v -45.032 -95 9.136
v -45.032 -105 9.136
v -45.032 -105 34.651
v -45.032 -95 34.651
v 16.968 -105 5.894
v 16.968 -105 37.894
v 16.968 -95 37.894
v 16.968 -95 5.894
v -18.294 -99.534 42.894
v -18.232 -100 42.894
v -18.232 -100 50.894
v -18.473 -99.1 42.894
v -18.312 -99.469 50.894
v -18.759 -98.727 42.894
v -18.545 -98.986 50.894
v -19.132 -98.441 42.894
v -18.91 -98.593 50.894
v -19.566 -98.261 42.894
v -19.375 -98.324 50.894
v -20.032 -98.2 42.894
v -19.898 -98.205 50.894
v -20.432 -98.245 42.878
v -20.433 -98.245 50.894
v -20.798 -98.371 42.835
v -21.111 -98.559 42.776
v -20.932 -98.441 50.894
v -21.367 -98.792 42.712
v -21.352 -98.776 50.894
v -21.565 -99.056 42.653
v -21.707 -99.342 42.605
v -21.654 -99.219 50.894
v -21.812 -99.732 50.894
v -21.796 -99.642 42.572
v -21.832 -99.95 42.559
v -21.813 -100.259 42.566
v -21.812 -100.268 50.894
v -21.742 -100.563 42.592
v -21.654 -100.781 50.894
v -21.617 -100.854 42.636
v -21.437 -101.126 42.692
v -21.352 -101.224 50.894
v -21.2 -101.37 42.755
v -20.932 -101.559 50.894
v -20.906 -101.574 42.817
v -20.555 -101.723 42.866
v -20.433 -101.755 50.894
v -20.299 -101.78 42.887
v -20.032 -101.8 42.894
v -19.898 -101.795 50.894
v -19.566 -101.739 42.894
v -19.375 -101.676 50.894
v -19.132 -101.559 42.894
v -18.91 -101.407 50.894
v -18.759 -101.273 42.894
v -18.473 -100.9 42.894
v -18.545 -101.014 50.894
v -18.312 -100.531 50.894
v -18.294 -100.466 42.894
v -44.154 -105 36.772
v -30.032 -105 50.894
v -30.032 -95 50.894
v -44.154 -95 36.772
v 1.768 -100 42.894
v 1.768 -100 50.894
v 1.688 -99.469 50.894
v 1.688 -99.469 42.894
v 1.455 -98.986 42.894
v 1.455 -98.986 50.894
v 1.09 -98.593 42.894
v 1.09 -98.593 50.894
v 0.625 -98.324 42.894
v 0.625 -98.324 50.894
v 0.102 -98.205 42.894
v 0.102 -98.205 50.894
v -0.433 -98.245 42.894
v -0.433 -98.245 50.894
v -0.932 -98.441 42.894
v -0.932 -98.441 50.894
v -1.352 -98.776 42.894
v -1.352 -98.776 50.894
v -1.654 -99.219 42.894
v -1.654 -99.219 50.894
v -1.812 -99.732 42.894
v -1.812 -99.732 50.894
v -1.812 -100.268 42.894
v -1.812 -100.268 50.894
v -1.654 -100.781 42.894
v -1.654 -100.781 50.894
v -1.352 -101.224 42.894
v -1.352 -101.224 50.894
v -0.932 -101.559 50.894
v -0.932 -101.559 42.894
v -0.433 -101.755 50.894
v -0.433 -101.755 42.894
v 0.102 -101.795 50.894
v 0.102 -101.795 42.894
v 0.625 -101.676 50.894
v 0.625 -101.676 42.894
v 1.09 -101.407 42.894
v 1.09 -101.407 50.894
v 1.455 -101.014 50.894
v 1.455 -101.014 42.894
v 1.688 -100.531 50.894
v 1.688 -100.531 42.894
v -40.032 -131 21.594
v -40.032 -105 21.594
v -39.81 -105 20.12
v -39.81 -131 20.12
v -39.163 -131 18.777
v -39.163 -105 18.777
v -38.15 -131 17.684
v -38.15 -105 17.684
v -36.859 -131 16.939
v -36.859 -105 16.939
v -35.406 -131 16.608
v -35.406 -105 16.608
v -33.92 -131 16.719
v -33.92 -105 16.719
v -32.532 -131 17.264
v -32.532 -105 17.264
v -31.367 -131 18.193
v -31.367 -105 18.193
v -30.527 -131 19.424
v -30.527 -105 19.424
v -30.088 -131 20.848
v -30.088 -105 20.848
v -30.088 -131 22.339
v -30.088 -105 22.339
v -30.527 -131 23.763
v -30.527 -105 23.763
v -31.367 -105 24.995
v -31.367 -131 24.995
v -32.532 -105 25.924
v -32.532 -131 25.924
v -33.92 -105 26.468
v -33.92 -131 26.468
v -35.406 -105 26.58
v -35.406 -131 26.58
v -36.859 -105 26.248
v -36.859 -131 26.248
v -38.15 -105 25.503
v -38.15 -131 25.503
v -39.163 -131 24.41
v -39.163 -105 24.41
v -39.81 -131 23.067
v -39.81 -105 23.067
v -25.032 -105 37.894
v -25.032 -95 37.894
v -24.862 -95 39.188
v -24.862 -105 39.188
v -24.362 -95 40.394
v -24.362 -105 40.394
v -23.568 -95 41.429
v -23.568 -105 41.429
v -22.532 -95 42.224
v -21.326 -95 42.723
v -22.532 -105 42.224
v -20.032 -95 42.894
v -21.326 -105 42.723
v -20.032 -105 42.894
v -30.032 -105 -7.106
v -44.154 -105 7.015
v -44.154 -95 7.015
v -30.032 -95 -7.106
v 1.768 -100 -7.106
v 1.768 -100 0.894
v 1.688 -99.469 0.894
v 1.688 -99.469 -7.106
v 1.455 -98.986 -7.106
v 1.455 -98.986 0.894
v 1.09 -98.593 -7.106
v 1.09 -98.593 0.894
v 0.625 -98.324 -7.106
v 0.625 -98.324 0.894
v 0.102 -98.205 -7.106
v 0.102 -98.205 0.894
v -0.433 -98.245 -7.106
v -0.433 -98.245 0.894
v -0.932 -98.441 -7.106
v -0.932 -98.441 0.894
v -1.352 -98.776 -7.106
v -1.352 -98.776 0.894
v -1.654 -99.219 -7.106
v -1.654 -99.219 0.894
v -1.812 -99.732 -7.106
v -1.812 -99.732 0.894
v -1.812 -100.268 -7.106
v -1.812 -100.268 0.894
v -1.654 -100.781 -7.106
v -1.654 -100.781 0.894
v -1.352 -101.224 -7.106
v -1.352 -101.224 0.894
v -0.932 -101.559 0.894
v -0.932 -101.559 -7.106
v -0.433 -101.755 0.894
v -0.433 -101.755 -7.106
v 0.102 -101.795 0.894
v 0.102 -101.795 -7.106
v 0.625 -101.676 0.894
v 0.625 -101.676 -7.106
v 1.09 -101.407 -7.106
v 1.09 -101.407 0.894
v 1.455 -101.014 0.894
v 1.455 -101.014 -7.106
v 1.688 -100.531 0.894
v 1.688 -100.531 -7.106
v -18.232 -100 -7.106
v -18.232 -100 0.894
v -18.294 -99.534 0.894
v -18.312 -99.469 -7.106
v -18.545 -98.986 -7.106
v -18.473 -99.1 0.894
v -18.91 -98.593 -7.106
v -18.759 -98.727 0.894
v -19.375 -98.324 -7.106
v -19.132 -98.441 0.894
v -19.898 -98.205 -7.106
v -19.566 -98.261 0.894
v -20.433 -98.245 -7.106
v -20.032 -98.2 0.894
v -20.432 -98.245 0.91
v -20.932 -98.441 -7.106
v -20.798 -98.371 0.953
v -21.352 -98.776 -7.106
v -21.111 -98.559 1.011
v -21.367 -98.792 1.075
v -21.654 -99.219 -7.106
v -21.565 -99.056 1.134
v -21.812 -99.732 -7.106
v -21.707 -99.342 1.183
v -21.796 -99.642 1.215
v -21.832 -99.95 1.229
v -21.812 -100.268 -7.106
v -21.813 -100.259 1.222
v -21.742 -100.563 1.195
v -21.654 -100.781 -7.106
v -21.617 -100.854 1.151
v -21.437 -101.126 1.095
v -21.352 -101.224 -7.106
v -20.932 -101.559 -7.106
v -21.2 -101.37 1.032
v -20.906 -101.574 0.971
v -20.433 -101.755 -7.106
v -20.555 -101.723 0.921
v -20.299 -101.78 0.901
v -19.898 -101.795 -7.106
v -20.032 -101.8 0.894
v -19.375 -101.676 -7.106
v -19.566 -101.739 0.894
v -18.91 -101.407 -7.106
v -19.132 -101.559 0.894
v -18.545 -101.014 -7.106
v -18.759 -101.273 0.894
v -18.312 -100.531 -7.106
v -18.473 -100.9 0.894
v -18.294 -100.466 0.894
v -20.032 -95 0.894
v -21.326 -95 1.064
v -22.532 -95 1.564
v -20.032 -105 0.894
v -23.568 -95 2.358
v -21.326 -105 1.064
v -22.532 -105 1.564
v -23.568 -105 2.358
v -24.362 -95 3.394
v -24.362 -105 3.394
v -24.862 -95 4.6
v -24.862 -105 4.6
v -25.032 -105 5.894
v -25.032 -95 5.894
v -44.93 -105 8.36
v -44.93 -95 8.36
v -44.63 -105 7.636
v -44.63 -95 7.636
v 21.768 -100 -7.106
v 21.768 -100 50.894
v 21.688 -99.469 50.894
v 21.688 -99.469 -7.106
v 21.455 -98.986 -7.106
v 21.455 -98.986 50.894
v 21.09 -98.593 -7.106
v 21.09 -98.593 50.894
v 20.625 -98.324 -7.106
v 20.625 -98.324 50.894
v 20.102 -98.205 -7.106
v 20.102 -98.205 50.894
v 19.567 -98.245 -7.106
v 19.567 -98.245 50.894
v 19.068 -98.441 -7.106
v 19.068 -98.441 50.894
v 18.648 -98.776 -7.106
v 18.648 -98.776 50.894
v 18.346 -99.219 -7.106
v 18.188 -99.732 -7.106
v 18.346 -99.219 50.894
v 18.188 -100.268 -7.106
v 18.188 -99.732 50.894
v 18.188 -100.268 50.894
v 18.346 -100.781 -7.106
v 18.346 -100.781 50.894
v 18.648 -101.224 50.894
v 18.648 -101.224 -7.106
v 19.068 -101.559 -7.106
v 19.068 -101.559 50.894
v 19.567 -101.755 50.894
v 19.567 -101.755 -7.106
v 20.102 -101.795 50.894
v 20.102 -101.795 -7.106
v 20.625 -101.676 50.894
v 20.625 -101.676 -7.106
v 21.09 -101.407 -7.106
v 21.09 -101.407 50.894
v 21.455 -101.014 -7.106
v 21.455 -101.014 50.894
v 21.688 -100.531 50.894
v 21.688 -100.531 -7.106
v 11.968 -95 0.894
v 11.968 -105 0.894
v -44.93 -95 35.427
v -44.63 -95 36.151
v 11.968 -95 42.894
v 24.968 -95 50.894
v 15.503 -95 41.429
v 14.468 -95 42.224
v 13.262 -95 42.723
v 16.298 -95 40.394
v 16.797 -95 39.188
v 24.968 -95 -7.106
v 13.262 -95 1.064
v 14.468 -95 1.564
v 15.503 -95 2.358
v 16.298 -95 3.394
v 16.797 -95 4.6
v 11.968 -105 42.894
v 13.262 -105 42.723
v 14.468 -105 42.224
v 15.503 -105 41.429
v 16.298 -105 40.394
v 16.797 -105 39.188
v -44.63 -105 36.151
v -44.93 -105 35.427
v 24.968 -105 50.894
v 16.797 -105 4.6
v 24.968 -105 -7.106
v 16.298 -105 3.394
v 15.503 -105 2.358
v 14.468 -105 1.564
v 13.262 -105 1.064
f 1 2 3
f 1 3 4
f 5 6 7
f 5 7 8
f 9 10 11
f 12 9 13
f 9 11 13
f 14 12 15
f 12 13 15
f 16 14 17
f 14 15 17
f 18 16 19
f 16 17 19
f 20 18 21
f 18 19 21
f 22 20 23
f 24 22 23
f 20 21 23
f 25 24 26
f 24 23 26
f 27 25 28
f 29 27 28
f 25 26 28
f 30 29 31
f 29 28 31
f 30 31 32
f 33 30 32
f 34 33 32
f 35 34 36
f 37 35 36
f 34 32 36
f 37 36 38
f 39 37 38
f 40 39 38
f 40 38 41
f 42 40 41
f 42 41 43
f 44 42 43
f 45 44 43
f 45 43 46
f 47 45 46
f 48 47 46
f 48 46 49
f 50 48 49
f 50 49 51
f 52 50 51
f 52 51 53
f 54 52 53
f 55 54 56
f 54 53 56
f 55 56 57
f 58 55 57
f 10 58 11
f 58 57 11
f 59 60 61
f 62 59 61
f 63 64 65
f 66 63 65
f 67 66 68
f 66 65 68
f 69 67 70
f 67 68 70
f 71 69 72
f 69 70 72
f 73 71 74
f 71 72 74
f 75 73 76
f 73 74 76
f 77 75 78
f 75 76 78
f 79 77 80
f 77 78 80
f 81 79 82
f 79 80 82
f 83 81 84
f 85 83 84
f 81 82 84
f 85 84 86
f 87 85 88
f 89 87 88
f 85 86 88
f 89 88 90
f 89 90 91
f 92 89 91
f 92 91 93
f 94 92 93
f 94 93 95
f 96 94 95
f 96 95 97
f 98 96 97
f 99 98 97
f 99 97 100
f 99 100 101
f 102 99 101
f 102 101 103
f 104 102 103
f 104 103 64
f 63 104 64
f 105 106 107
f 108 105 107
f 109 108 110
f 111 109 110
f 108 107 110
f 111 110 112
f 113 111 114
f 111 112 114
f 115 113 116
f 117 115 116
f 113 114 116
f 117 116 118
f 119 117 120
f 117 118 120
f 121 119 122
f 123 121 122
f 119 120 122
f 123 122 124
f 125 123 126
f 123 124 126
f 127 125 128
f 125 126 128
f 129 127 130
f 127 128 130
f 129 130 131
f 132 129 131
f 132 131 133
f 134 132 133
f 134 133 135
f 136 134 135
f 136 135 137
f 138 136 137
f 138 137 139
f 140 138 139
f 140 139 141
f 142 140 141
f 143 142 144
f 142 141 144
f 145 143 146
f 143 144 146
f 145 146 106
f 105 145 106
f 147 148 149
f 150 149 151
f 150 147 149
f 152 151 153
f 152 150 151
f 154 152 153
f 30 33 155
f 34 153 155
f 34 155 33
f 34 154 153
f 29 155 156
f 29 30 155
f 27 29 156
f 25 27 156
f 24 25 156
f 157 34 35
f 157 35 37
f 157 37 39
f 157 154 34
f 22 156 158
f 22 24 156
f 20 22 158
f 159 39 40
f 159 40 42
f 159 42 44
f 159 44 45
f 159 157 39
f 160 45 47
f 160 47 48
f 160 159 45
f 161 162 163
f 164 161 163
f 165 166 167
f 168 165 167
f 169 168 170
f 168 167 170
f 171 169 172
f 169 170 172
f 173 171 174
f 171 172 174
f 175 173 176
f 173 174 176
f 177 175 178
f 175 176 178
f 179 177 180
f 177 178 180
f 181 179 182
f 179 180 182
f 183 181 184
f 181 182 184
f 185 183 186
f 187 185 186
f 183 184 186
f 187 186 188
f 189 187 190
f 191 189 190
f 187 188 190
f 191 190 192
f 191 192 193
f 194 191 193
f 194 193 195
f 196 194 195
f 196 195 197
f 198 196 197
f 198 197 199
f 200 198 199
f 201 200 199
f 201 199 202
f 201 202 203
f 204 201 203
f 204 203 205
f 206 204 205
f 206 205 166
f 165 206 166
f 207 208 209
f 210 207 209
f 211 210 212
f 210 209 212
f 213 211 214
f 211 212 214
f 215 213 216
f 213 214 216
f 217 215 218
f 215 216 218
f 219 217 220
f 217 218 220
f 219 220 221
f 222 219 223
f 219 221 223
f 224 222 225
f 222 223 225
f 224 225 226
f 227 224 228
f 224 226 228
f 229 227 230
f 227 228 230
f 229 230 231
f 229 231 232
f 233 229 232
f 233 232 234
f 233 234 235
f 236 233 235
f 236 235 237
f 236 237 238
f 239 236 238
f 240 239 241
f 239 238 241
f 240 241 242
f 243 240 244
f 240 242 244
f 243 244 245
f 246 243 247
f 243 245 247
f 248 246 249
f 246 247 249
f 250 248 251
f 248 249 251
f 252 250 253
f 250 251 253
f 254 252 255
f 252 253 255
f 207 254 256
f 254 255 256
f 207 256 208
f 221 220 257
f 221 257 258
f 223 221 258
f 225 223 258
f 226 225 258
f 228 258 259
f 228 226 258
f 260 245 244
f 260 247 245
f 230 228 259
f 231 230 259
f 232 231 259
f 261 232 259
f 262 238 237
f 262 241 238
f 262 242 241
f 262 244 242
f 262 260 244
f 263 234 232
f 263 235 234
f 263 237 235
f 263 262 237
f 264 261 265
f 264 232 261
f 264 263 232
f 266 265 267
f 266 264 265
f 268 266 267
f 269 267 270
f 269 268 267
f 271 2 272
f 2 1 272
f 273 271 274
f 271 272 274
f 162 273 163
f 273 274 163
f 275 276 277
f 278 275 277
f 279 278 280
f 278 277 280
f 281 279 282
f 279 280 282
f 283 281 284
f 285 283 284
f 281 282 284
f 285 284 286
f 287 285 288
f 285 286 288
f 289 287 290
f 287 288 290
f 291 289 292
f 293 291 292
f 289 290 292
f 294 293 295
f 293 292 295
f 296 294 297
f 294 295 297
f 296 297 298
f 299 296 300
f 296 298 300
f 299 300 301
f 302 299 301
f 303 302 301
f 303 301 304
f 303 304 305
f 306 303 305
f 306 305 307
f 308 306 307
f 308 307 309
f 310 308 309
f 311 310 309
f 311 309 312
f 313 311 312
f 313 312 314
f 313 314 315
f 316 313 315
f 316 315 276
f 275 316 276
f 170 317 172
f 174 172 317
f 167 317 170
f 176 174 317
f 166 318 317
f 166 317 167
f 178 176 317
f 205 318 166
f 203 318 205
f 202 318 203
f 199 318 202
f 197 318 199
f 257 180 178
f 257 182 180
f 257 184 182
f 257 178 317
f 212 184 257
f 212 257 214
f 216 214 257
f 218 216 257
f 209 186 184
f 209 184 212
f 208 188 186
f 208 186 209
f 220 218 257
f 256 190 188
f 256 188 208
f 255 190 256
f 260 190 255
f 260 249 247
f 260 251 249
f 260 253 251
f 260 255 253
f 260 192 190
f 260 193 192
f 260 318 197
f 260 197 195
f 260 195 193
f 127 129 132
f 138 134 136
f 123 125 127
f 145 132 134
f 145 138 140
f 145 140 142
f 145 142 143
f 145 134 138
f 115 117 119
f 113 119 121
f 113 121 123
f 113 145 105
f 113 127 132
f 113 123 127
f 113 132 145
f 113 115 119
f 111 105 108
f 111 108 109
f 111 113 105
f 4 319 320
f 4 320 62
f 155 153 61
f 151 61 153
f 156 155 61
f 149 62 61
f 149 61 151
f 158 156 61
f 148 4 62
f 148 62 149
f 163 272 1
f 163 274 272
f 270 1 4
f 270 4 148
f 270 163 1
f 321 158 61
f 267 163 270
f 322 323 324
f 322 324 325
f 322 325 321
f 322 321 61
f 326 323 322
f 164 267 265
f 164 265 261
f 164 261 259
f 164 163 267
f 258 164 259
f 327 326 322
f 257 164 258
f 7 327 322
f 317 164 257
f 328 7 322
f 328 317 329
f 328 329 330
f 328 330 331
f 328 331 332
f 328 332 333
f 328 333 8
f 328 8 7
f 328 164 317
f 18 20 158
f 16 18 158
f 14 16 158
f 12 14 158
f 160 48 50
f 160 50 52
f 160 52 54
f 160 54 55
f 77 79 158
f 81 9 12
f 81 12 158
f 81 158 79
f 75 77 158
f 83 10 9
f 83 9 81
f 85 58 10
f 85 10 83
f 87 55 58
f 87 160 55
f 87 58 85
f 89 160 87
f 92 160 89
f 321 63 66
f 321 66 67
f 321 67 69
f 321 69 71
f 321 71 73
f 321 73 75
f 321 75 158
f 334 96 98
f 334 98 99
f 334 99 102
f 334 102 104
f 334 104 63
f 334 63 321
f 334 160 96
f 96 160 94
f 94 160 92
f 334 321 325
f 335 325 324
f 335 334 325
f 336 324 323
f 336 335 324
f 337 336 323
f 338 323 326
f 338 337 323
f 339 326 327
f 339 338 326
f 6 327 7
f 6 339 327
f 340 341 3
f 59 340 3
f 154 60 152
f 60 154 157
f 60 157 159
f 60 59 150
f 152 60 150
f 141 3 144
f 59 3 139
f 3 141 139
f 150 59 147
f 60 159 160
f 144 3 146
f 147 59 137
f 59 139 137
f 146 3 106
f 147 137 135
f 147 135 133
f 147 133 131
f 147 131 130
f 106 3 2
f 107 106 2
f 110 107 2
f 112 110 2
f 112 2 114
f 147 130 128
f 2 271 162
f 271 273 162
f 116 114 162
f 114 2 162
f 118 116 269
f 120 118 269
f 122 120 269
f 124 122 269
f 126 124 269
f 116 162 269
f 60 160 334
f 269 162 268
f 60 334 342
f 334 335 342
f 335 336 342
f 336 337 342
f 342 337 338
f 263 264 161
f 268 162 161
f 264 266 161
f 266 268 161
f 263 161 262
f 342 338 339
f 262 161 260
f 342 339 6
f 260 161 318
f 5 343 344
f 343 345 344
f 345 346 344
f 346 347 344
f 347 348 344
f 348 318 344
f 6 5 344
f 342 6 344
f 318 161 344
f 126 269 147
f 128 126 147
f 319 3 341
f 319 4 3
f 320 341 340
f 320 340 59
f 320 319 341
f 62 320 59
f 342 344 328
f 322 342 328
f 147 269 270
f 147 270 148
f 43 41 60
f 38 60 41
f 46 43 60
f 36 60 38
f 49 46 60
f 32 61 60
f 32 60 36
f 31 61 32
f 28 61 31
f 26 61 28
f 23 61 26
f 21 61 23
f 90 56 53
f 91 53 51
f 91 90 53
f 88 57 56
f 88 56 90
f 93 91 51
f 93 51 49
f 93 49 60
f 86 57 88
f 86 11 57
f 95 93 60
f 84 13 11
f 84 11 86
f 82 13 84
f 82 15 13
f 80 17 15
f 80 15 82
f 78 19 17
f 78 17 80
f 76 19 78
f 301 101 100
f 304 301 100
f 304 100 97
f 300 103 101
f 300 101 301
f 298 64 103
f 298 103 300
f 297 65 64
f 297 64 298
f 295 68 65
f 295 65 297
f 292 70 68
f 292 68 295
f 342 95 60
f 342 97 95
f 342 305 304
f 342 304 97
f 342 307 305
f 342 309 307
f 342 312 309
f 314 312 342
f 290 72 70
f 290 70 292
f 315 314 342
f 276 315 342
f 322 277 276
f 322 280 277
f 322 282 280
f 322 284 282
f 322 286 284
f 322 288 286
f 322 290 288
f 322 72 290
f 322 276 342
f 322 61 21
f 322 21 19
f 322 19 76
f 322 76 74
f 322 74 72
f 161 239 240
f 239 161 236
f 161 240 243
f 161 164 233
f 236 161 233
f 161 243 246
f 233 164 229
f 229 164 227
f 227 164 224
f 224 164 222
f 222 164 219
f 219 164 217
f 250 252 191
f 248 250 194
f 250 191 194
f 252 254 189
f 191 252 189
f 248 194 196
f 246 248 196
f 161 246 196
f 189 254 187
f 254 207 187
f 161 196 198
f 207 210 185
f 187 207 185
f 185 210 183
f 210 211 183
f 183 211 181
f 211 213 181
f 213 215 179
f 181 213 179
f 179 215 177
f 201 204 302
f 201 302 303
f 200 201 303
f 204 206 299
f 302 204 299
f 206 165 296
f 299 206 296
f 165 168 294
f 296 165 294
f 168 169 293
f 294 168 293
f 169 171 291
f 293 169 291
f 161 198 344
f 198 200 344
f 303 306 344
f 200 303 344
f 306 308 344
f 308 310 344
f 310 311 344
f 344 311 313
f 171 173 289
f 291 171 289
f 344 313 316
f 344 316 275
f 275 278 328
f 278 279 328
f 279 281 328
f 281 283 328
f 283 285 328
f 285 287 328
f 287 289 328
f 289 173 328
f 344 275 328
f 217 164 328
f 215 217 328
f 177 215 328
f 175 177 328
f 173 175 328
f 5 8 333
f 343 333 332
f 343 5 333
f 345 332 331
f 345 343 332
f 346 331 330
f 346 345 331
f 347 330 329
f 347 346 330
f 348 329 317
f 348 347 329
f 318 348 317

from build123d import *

# Parameters (mm, degrees)
SKETCH1_W          = 70
SKETCH1_H          = 10
EXTRUDE1_DEPTH     = 58
SKETCH2_R          = 5
EXTRUDE2_DEPTH     = 26
CUT_EXTRUDE1_DEPTH = 30
CHAMFER1_SIZE      = 15
FILLET1_R          = 3
SKETCH4_R          = 1.8
CUT_EXTRUDE2_DEPTH = 60


with BuildPart() as part:
    # Sketch1 → Extrude1 (new body)
    with BuildSketch(Plane.XY.offset(-7.106345979)):
        with Locations((-10.032216865, -100)):
            Rectangle(SKETCH1_W, SKETCH1_H)
    extrude(amount=EXTRUDE1_DEPTH)

    # Sketch2 → Extrude2 (add)
    with BuildSketch(Plane.XZ.offset(105)):
        with Locations(Location((-35.032216865, 21.593654021, 0), (0, 0, 180))):
            Circle(SKETCH2_R)
    extrude(amount=EXTRUDE2_DEPTH)

    # Sketch3 → Cut-Extrude1 (cut)
    with BuildSketch(Plane.XZ.offset(105)):
        with BuildLine():
            Line((-20.032216865, 42.893654021), (11.967783135, 42.893654021))
            ThreePointArc((11.967783135, 42.893654021), (15.503317041, 41.429187927), (16.967783135, 37.893654021))
            Line((16.967783135, 37.893654021), (16.967783135, 5.893654021))
            ThreePointArc((16.967783135, 5.893654021), (15.503317041, 2.358120115), (11.967783135, 0.893654021))
            Line((11.967783135, 0.893654021), (-20.032216865, 0.893654021))
            ThreePointArc((-20.032216865, 0.893654021), (-23.567750771, 2.358120115), (-25.032216865, 5.893654021))
            Line((-25.032216865, 5.893654021), (-25.032216865, 37.893654021))
            ThreePointArc((-25.032216865, 37.893654021), (-23.567750771, 41.429187927), (-20.032216865, 42.893654021))
        make_face()
    extrude(amount=-CUT_EXTRUDE1_DEPTH, mode=Mode.SUBTRACT)

    # Chamfer1
    chamfer1_edges = [part.edges().sort_by_distance(p)[0] for p in [
        (-45.032216865, -100, 50.893654021),
        (-45.032216865, -100, -7.106345979),
    ]]
    chamfer(chamfer1_edges, length=CHAMFER1_SIZE)

    # Fillet1
    fillet1_edges = [part.edges().sort_by_distance(p)[0] for p in [
        (-45.032216865, -100, 35.893654021),
        (-45.032216865, -100, 7.893654021),
    ]]
    fillet(fillet1_edges, radius=FILLET1_R)

    # Sketch4 → Cut-Extrude2 (cut)
    with BuildSketch(Plane.XY.offset(50.893654021)):
        with Locations((-20.032216865, -100)):
            Circle(SKETCH4_R)
        with Locations((-0.032216865, -100)):
            Circle(SKETCH4_R)
        with Locations((19.967783135, -100)):
            Circle(SKETCH4_R)
    extrude(amount=-CUT_EXTRUDE2_DEPTH, mode=Mode.SUBTRACT)


solid = part.part
